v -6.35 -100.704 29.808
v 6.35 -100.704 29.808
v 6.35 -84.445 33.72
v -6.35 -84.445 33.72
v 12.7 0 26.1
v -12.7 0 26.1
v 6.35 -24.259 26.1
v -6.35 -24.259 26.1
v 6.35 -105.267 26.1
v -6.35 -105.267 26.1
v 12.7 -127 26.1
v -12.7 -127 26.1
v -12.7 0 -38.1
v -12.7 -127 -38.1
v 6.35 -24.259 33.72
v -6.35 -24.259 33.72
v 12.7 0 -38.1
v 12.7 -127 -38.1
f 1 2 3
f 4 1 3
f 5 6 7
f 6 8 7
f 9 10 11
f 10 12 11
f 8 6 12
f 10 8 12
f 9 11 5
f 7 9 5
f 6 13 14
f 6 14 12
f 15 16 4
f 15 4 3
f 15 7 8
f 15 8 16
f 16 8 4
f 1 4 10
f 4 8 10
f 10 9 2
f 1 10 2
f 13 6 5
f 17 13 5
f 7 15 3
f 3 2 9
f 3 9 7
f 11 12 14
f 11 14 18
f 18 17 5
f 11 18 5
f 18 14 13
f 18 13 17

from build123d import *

# Parameters (mm, degrees)
F0_W     = 25.4
F0_H     = 76.2
F1_DEPTH = 127
F3_DEPTH = 177.8
F4_W     = 24.25904
F4_H     = 7.62
F5_DEPTH = 25.4


with BuildPart() as f1:
    # F0 (on Front) → F1 (new body)
    with BuildSketch(Plane.XZ):
        Rectangle(F0_W, F0_H)
    extrude(amount=F1_DEPTH)

    # F2 (on face) → F3 (cut)
    with BuildSketch(Plane.XZ.offset(127)):
        Polygon((6.35, 26.099518), (12.7, 26.099518), (12.7, 38.1), (-12.7, 38.1), (-12.7, 26.099518), (-6.35, 26.099518), (-6.35, 33.719518), (6.35, 33.719518), align=None)
    extrude(amount=-F3_DEPTH, mode=Mode.SUBTRACT)

    # F4 (on face) → F5 (cut)
    with BuildSketch(Plane.YZ.offset(6.35)):
        Polygon((-100.70353, 29.807648), (-84.444813, 33.719518), (-127, 33.719518), (-127, 26.099518), (-105.267383, 26.099518), align=None)
        with Locations((-12.12952, 29.909518)):
            Rectangle(F4_W, F4_H)
    extrude(amount=-F5_DEPTH, mode=Mode.SUBTRACT)


solid = f1.part
